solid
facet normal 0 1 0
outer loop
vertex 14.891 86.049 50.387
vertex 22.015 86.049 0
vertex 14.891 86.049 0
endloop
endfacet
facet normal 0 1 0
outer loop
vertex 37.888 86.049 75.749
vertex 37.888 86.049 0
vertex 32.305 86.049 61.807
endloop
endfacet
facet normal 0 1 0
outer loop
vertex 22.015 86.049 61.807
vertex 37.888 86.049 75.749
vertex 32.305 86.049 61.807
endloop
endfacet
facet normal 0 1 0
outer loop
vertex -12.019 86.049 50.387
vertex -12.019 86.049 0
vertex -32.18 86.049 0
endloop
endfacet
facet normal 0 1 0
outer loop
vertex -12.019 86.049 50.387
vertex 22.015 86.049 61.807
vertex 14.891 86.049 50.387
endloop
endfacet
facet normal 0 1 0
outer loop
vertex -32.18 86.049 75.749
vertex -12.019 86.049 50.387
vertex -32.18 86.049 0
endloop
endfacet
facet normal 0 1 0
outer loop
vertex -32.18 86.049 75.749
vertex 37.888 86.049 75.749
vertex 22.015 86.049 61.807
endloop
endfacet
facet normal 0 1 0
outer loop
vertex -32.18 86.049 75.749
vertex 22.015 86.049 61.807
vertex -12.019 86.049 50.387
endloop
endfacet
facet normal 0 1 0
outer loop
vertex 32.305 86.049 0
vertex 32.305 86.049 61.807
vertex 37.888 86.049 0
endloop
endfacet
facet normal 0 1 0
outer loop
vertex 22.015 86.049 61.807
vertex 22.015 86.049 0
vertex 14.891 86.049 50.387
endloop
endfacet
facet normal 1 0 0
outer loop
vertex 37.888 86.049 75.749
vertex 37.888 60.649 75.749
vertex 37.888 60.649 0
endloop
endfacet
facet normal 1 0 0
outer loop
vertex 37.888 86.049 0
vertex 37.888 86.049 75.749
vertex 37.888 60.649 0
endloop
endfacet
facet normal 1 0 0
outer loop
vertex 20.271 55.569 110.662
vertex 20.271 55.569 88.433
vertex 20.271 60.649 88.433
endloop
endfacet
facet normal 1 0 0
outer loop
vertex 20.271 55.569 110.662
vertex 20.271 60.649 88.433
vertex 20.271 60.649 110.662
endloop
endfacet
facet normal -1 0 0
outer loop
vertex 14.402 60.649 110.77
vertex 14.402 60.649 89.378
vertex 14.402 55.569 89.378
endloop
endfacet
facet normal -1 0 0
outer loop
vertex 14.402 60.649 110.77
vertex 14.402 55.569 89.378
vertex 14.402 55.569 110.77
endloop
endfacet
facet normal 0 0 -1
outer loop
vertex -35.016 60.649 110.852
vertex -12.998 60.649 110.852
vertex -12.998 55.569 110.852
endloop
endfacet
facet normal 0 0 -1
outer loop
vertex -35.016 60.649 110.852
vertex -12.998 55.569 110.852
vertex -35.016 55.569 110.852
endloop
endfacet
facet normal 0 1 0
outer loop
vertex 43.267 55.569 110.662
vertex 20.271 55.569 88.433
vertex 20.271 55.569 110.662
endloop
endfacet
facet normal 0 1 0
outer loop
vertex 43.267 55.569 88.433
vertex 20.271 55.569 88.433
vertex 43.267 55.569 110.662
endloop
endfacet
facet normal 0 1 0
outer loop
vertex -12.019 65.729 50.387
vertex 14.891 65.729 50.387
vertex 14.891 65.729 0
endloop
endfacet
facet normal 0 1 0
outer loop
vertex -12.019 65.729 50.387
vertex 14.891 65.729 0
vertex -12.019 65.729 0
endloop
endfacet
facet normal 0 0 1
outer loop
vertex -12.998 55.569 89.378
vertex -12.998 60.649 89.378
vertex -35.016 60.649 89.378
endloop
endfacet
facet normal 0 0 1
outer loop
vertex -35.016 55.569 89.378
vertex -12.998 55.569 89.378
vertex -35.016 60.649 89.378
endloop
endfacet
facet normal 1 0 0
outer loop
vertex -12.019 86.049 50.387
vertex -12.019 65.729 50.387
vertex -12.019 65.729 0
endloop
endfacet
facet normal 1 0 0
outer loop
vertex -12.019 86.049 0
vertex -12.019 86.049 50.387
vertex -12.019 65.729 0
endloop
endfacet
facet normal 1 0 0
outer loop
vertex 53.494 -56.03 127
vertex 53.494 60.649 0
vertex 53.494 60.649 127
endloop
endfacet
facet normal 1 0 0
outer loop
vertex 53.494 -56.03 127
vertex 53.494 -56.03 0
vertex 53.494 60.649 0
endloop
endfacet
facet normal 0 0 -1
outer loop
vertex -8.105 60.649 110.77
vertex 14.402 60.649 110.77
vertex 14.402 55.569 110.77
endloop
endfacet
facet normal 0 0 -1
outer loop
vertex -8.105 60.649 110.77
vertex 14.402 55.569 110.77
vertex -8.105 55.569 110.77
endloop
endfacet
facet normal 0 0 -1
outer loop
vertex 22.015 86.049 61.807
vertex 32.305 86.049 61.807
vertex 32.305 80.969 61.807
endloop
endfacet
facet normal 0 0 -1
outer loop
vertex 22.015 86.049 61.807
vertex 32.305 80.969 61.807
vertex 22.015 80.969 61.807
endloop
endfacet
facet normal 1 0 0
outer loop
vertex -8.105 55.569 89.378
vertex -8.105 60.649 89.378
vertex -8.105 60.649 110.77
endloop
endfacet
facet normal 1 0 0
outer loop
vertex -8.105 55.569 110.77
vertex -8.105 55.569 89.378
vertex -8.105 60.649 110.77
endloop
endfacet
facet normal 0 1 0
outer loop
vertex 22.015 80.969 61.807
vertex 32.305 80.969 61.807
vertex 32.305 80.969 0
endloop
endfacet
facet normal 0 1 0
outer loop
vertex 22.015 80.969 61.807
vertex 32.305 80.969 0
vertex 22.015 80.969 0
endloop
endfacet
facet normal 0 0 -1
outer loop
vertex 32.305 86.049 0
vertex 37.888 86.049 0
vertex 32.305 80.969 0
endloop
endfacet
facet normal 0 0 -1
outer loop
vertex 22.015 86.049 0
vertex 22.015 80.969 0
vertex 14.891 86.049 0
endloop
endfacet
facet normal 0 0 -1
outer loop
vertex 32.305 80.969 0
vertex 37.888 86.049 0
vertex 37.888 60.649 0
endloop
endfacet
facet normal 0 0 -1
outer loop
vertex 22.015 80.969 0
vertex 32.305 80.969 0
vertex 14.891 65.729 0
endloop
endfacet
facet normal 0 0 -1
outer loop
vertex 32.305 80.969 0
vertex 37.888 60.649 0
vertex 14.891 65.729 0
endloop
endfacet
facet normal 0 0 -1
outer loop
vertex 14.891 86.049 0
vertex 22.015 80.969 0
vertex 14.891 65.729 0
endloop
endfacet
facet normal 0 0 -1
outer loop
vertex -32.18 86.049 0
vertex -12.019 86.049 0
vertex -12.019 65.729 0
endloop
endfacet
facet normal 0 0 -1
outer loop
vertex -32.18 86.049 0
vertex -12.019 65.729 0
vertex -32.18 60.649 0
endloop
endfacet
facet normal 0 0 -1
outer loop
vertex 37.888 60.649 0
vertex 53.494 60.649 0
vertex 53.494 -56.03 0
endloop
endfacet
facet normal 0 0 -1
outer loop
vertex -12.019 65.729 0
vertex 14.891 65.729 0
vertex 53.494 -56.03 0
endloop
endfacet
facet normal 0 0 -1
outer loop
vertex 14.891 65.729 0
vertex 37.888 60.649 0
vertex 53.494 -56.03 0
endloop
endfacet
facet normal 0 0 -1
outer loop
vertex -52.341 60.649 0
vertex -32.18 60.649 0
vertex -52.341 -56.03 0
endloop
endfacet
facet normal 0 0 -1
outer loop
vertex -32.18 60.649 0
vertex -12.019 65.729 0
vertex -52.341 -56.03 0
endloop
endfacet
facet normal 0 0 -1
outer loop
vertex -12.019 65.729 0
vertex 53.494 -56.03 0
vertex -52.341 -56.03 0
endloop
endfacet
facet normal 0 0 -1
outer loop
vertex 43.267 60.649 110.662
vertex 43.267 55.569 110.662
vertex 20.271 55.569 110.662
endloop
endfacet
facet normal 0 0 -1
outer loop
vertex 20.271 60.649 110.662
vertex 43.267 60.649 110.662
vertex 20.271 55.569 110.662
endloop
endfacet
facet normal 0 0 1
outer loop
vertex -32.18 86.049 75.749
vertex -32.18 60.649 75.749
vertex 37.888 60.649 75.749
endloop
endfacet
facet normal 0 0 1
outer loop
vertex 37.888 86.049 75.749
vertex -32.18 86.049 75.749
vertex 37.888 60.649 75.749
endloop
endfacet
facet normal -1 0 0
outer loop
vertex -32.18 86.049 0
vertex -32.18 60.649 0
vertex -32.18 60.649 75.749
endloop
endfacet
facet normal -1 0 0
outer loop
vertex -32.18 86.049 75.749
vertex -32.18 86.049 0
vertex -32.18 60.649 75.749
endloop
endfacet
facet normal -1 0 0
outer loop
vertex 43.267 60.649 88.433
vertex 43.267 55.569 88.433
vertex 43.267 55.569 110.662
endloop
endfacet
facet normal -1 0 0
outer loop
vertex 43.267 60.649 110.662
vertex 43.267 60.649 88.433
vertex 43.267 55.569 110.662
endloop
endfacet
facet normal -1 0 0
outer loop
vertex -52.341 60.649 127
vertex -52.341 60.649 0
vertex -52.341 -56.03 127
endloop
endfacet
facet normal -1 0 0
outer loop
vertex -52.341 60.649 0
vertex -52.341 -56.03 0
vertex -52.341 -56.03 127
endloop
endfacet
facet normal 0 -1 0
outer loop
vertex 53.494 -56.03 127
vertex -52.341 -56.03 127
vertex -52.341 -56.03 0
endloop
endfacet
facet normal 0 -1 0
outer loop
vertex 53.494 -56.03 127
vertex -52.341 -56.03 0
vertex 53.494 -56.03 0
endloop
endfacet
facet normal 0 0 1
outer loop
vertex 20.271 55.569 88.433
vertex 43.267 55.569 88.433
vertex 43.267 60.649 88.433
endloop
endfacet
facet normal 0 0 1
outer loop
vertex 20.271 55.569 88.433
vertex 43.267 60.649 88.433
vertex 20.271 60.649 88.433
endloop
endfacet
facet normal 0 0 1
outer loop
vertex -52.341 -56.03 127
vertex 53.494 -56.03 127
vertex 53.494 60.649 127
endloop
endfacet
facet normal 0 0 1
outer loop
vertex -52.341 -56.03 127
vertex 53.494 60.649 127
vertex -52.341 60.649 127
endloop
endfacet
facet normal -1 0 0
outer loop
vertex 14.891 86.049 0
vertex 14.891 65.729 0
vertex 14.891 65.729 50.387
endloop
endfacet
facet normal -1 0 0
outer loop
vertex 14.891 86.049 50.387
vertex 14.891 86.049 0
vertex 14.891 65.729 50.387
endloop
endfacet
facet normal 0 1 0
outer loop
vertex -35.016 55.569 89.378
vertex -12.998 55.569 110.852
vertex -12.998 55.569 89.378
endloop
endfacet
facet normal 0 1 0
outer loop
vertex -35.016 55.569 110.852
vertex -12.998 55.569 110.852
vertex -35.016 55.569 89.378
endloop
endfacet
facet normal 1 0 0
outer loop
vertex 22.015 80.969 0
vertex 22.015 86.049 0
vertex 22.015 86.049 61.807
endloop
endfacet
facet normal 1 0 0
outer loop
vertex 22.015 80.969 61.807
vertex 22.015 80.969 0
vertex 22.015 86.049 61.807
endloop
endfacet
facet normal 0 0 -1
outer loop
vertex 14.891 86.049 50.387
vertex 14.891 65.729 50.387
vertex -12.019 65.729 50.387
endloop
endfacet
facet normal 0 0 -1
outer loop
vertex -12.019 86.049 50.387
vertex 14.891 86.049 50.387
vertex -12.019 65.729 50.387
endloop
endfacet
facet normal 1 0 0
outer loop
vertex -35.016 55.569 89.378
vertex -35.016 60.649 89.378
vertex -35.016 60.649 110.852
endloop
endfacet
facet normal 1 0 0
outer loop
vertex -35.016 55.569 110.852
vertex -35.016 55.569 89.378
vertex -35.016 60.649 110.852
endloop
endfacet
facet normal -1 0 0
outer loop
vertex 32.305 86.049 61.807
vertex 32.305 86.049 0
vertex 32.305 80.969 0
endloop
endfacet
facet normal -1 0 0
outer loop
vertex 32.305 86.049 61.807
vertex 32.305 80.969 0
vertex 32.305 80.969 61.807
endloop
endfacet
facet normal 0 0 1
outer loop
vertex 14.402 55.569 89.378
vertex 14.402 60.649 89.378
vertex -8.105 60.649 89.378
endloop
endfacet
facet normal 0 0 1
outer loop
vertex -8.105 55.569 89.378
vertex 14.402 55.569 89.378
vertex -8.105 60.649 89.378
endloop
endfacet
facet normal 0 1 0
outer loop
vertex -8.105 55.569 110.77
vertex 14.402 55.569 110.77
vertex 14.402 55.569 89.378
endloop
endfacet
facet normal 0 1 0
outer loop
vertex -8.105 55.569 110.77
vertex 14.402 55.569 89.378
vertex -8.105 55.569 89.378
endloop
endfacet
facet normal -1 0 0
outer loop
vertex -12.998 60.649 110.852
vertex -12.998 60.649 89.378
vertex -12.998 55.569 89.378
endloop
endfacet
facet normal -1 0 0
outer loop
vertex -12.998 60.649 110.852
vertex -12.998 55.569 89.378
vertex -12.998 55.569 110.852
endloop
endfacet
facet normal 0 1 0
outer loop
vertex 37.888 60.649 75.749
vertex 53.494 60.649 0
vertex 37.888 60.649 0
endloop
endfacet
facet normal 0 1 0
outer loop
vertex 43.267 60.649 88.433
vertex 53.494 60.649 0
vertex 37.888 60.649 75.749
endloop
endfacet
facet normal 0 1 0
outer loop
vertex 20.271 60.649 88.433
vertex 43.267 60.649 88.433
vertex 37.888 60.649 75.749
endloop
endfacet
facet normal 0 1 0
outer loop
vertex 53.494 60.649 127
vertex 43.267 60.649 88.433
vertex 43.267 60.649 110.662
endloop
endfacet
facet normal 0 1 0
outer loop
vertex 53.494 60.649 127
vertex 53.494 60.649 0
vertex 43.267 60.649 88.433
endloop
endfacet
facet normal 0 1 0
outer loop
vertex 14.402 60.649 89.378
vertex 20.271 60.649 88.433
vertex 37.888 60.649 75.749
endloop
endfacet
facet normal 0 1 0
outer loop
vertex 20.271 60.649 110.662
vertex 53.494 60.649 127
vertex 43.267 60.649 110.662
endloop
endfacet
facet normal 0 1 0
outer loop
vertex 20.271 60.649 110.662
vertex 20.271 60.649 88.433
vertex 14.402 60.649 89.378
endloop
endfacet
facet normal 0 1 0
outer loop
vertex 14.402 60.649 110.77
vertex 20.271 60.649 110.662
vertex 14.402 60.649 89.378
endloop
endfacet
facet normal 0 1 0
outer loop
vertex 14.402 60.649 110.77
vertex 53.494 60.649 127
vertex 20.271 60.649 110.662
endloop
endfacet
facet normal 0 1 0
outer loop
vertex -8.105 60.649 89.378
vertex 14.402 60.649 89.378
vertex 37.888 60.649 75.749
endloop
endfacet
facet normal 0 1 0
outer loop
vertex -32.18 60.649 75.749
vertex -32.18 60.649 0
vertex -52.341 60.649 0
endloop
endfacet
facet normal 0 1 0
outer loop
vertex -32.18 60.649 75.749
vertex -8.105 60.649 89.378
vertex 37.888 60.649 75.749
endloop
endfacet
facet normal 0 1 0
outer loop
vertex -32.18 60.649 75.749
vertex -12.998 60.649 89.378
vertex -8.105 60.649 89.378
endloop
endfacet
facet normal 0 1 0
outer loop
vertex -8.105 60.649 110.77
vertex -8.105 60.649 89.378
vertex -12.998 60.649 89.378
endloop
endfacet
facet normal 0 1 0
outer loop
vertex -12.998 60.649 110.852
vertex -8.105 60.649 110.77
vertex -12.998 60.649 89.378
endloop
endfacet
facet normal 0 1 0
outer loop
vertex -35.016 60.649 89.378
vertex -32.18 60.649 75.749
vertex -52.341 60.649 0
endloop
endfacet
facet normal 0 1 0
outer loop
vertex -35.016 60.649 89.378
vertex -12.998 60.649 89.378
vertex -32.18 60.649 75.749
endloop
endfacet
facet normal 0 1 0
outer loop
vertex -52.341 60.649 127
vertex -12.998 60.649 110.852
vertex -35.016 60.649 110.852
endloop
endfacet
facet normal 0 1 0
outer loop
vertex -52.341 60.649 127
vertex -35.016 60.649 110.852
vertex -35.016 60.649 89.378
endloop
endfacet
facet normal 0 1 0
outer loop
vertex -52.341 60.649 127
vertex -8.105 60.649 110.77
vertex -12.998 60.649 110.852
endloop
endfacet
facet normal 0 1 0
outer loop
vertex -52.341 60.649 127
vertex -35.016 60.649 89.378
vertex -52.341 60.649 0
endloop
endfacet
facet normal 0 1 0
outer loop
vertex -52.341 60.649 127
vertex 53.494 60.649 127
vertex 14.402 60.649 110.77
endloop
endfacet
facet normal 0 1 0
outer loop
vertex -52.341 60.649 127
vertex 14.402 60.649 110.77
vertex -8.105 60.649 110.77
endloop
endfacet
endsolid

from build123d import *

# Parameters (mm, degrees)
F0_W      = 105.8345548809
F0_H      = 111.5989610553
F1_DEPTH  = 127
F2_W      = 105.8345548809
F2_H      = 127
F2_W_2    = 22.996397689
F2_H_2    = 22.2293362021
F3_DEPTH  = 5.08
F4_W      = 26.9106691703
F4_H      = 50.3869839013
F5_DEPTH  = 5.08
F7_DEPTH  = 25.4
F8_W      = 22.5071115419
F8_H      = 21.3920027018
F9_DEPTH  = 5.08
F10_W     = 22.0178281888
F10_H     = 21.4731246233
F11_DEPTH = 5.08
F12_W     = 10.2898292243
F12_H     = 61.8074573576
F13_DEPTH = 5.08


with BuildPart() as f1:
    # F0 (on Top) → F1 (new body)
    with BuildSketch(Plane.XY):
        with Locations((0.5764421076, -0.230576843)):
            Rectangle(F0_W, F0_H)
    extrude(amount=F1_DEPTH)

    # F2 (on face) → F3 (join)
    with BuildSketch(Plane(origin=(0, 55.5689036846, 0), x_dir=(-1, 0, 0), z_dir=(0, 1, 0))):
        with Locations((-0.5764421076, 63.5)):
            Rectangle(F2_W, F2_H)
        with Locations((-31.7689729854, 99.5473898947)):
            Rectangle(F2_W_2, F2_H_2, mode=Mode.SUBTRACT)
    extrude(amount=F3_DEPTH)

    # F4 (on face) → F5 (join)
    with BuildSketch(Plane(origin=(0, 60.6489036846, 0), x_dir=(-1, 0, 0), z_dir=(0, 1, 0))):
        with Locations((-1.4360728674, 25.1934919506)):
            Rectangle(F4_W, F4_H)
    extrude(amount=F5_DEPTH)

    # F6 (on face) → F7 (join)
    with BuildSketch(Plane(origin=(0, 60.6489036846, 0), x_dir=(-1, 0, 0), z_dir=(0, 1, 0))):
        Polygon((-37.8878116608, 0), (-29.5699629933, 0), (-29.5699629933, 55.8542273939), (22.2942437977, 55.8542273939), (22.2942437977, 0), (32.1800485253, 0), (32.1800485253, 75.7494047284), (-37.8878116608, 75.7494047284), align=None)
        Polygon((-29.5699629933, 55.8542273939), (-29.5699629933, 0), (-14.8914074525, 0), (-14.8914074525, 50.3869839013), (12.0192617178, 50.3869839013), (12.0192617178, 0), (22.2942437977, 0), (22.2942437977, 55.8542273939), align=None)
    extrude(amount=F7_DEPTH)

    # F8 (on face) → F9 (cut)
    with BuildSketch(Plane(origin=(0, 60.6489036846, 0), x_dir=(-1, 0, 0), z_dir=(0, 1, 0))):
        with Locations((-3.1485739164, 100.074402988)):
            Rectangle(F8_W, F8_H)
    extrude(amount=-F9_DEPTH, mode=Mode.SUBTRACT)

    # F10 (on face) → F11 (cut)
    with BuildSketch(Plane(origin=(0, 60.6489036846, 0), x_dir=(-1, 0, 0), z_dir=(0, 1, 0))):
        with Locations((24.006747175, 100.1149639487)):
            Rectangle(F10_W, F10_H)
    extrude(amount=-F11_DEPTH, mode=Mode.SUBTRACT)

    # F12 (on face) → F13 (cut)
    with BuildSketch(Plane(origin=(0, 86.0489036846, 0), x_dir=(-1, 0, 0), z_dir=(0, 1, 0))):
        with Locations((-27.1603707224, 30.9037286788)):
            Rectangle(F12_W, F12_H)
    extrude(amount=-F13_DEPTH, mode=Mode.SUBTRACT)


solid = f1.part
